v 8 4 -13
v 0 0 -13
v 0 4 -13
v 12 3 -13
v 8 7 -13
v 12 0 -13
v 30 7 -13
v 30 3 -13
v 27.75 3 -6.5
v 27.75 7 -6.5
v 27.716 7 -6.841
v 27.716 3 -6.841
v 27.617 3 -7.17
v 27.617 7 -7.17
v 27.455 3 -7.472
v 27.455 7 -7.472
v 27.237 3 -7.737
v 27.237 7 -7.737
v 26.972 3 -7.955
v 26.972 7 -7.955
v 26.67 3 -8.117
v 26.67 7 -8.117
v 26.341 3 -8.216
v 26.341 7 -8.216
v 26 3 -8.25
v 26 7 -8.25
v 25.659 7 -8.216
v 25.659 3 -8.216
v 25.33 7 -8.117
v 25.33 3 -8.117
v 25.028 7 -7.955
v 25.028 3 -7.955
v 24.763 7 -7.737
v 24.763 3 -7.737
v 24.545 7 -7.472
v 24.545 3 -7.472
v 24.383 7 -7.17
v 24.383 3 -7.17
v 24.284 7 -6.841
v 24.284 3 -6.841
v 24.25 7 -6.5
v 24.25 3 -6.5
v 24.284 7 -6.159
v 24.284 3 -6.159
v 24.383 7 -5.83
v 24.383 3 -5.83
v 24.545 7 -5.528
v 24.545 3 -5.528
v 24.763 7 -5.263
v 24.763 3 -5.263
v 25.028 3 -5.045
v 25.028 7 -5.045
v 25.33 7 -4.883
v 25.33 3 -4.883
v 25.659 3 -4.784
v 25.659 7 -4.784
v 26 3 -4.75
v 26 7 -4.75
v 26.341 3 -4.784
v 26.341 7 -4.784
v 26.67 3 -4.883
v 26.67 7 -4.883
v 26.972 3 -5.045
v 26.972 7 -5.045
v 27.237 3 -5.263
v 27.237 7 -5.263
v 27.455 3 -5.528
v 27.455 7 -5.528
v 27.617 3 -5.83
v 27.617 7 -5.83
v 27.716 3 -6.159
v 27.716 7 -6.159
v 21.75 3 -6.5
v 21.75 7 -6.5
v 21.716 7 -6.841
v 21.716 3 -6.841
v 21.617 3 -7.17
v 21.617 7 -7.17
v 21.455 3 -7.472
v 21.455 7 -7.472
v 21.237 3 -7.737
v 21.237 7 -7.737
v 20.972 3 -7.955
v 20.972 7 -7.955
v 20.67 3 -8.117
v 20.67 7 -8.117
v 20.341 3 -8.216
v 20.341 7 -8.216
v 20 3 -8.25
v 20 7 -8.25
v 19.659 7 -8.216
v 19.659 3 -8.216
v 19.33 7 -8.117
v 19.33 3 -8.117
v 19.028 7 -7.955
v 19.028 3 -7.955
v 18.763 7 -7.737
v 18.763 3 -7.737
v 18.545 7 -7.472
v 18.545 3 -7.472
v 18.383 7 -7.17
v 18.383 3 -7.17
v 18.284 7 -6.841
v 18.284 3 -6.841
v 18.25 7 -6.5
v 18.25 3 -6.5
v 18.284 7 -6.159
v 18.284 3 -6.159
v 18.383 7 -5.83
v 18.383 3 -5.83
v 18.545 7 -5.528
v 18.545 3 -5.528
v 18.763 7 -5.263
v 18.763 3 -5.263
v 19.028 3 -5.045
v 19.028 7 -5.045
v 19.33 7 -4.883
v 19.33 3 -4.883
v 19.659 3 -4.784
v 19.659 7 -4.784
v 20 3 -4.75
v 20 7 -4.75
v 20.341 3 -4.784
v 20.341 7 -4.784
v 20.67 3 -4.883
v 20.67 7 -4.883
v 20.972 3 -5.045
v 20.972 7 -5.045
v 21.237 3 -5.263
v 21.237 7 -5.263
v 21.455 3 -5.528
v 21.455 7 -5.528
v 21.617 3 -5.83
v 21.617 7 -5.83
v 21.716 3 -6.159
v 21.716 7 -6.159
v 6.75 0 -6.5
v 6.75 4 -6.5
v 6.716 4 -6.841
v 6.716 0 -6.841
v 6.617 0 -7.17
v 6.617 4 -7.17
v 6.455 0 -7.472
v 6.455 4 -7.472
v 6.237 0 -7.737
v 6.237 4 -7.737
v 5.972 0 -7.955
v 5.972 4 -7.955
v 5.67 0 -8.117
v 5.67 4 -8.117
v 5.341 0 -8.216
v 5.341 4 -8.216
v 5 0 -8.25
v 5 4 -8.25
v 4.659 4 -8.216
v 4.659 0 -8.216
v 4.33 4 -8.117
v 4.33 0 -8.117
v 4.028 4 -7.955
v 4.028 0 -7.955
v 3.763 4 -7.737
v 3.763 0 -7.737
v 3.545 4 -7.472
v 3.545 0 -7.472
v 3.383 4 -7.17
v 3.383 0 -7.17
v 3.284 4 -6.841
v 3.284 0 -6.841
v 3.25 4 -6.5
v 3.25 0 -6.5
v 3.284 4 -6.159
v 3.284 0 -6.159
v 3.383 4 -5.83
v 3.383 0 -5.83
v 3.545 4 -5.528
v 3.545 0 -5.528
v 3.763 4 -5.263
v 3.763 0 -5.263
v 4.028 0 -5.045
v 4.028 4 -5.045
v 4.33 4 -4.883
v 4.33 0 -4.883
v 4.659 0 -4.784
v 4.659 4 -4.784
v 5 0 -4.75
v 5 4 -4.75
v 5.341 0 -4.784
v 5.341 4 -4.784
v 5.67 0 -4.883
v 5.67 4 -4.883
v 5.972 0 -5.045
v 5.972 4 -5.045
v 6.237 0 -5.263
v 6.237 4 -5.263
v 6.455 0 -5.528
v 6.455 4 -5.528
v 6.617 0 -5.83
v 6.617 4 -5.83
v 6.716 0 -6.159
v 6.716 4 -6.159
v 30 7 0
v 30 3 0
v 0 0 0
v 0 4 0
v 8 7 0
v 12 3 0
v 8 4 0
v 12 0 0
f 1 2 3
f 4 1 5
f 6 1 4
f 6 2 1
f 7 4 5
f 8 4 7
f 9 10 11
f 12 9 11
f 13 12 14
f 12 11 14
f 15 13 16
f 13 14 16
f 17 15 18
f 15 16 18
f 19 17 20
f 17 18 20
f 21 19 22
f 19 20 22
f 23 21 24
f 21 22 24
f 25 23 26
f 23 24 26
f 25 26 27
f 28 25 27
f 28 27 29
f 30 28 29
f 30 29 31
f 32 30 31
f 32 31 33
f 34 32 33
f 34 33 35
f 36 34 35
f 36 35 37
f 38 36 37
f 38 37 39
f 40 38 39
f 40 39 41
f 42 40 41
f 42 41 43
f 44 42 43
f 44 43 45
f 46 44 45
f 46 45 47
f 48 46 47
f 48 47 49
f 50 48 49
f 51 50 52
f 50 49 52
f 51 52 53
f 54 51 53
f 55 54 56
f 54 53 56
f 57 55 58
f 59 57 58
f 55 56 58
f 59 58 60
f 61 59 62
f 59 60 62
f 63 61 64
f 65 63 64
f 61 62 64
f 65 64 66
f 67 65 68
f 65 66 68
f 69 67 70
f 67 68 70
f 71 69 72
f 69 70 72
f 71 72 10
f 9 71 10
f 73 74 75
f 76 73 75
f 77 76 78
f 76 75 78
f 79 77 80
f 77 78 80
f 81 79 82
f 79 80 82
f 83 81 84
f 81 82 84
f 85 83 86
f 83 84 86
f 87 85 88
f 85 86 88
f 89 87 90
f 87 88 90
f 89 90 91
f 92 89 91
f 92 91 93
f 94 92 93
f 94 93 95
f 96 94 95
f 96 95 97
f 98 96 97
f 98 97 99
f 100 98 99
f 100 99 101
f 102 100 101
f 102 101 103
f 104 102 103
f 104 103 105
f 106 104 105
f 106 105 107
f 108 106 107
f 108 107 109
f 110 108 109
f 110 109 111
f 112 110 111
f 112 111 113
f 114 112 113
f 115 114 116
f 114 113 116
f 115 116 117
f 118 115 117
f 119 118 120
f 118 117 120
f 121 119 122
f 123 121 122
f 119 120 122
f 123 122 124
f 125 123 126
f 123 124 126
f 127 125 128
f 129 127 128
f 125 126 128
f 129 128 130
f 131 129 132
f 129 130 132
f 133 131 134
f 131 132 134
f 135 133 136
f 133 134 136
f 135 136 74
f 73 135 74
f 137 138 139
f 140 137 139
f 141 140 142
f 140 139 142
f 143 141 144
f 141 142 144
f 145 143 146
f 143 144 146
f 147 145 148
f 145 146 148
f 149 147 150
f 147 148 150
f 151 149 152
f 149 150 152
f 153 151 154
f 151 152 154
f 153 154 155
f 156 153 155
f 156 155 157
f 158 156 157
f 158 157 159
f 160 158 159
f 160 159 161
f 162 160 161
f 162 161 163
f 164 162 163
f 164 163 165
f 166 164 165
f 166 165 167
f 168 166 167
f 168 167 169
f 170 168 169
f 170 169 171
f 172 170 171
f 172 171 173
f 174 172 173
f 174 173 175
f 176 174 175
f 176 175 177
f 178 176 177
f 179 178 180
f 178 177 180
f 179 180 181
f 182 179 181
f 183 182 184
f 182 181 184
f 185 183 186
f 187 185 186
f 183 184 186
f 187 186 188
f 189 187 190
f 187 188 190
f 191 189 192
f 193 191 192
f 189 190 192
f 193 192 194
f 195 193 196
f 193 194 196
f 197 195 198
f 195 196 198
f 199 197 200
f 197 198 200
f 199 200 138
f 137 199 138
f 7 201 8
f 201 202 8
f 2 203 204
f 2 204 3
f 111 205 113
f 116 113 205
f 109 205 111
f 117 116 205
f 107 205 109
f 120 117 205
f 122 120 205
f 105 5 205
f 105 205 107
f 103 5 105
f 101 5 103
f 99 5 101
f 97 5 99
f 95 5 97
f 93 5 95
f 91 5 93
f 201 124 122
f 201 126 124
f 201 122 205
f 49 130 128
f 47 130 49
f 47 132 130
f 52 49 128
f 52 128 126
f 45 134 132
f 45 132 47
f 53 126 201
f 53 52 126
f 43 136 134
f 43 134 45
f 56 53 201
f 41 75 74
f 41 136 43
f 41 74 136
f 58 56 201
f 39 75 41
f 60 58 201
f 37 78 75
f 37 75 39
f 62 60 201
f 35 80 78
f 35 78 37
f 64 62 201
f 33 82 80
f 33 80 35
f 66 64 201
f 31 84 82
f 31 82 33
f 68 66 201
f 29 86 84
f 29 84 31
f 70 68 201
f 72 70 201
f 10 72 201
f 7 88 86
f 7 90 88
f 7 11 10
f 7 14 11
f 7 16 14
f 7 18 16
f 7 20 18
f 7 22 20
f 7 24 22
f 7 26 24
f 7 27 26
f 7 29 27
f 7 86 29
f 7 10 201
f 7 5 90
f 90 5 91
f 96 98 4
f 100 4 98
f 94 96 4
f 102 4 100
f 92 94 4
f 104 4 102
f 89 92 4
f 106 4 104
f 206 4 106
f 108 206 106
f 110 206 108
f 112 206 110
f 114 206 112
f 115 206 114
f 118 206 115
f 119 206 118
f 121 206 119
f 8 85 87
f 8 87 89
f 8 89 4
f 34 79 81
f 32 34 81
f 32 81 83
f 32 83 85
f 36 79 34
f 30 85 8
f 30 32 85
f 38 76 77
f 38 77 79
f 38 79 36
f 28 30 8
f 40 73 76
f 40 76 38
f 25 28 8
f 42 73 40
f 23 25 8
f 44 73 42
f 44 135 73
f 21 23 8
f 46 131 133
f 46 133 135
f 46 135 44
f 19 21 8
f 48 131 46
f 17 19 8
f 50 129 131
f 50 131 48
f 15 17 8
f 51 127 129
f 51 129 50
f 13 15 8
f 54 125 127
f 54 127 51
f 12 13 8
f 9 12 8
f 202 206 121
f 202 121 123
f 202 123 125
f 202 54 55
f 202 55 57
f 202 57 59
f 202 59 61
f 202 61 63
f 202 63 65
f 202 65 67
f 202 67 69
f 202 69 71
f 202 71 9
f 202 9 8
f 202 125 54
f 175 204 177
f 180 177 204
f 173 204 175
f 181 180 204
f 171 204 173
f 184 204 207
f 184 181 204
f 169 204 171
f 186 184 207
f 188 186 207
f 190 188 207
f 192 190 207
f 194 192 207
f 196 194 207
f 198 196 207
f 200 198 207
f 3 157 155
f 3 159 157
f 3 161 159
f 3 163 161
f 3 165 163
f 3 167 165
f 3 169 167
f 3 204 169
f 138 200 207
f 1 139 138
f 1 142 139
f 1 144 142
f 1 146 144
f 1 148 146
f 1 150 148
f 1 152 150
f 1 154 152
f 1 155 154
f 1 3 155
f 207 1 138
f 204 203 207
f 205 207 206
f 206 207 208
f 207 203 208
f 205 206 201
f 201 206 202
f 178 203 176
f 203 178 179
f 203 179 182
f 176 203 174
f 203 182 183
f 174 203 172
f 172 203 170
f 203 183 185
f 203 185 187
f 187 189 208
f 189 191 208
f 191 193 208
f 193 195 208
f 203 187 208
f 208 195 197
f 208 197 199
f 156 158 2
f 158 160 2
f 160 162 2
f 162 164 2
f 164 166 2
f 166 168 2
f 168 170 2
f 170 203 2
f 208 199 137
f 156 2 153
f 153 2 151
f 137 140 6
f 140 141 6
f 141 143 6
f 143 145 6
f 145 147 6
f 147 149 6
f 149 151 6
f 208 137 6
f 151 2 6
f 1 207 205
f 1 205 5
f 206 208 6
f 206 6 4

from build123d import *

# Parameters (mm, degrees)
SKETCH1_W           = 30
SKETCH1_H           = 13
BOSS_EXTRUDE1_DEPTH = 4
SKETCH2_W           = 18
SKETCH2_H           = 3
CUT_EXTRUDE1_DEPTH  = 14
SKETCH3_W           = 22
SKETCH3_H           = 13
BOSS_EXTRUDE2_DEPTH = 3
SKETCH4_R           = 1.75
CUT_EXTRUDE2_DEPTH  = 5
SKETCH7_R           = 1.75
CUT_EXTRUDE5_DEPTH  = 8


with BuildPart() as part:
    # Sketch1 → Boss-Extrude1 (new body)
    with BuildSketch(Plane(origin=(0, 0, 0), x_dir=(1, 0, 0), z_dir=(0, 1, 0))):
        with Locations((15, 6.5)):
            Rectangle(SKETCH1_W, SKETCH1_H)
    extrude(amount=BOSS_EXTRUDE1_DEPTH)

    # Sketch2 → Cut-Extrude1 (cut, through all)
    with BuildSketch(Plane.XY):
        with Locations((21, 1.5)):
            Rectangle(SKETCH2_W, SKETCH2_H)
    extrude(amount=-CUT_EXTRUDE1_DEPTH, mode=Mode.SUBTRACT)

    # Sketch3 → Boss-Extrude2 (add)
    with BuildSketch(Plane(origin=(0, 4, 0), x_dir=(1, 0, 0), z_dir=(0, 1, 0))):
        with Locations((19, 6.5)):
            Rectangle(SKETCH3_W, SKETCH3_H)
    extrude(amount=BOSS_EXTRUDE2_DEPTH)

    # Sketch4 → Cut-Extrude2 (cut, through all)
    with BuildSketch(Plane(origin=(0, 4, 0), x_dir=(1, 0, 0), z_dir=(0, 1, 0))):
        with Locations((5, 6.5)):
            Circle(SKETCH4_R)
    extrude(amount=-CUT_EXTRUDE2_DEPTH, mode=Mode.SUBTRACT)

    # Sketch7 → Cut-Extrude5 (cut, through all)
    with BuildSketch(Plane(origin=(0, 7, 0), x_dir=(1, 0, 0), z_dir=(0, 1, 0))):
        with Locations((20, 6.5)):
            Circle(SKETCH7_R)
        with Locations((26, 6.5)):
            Circle(SKETCH7_R)
    extrude(amount=-CUT_EXTRUDE5_DEPTH, mode=Mode.SUBTRACT)


solid = part.part
